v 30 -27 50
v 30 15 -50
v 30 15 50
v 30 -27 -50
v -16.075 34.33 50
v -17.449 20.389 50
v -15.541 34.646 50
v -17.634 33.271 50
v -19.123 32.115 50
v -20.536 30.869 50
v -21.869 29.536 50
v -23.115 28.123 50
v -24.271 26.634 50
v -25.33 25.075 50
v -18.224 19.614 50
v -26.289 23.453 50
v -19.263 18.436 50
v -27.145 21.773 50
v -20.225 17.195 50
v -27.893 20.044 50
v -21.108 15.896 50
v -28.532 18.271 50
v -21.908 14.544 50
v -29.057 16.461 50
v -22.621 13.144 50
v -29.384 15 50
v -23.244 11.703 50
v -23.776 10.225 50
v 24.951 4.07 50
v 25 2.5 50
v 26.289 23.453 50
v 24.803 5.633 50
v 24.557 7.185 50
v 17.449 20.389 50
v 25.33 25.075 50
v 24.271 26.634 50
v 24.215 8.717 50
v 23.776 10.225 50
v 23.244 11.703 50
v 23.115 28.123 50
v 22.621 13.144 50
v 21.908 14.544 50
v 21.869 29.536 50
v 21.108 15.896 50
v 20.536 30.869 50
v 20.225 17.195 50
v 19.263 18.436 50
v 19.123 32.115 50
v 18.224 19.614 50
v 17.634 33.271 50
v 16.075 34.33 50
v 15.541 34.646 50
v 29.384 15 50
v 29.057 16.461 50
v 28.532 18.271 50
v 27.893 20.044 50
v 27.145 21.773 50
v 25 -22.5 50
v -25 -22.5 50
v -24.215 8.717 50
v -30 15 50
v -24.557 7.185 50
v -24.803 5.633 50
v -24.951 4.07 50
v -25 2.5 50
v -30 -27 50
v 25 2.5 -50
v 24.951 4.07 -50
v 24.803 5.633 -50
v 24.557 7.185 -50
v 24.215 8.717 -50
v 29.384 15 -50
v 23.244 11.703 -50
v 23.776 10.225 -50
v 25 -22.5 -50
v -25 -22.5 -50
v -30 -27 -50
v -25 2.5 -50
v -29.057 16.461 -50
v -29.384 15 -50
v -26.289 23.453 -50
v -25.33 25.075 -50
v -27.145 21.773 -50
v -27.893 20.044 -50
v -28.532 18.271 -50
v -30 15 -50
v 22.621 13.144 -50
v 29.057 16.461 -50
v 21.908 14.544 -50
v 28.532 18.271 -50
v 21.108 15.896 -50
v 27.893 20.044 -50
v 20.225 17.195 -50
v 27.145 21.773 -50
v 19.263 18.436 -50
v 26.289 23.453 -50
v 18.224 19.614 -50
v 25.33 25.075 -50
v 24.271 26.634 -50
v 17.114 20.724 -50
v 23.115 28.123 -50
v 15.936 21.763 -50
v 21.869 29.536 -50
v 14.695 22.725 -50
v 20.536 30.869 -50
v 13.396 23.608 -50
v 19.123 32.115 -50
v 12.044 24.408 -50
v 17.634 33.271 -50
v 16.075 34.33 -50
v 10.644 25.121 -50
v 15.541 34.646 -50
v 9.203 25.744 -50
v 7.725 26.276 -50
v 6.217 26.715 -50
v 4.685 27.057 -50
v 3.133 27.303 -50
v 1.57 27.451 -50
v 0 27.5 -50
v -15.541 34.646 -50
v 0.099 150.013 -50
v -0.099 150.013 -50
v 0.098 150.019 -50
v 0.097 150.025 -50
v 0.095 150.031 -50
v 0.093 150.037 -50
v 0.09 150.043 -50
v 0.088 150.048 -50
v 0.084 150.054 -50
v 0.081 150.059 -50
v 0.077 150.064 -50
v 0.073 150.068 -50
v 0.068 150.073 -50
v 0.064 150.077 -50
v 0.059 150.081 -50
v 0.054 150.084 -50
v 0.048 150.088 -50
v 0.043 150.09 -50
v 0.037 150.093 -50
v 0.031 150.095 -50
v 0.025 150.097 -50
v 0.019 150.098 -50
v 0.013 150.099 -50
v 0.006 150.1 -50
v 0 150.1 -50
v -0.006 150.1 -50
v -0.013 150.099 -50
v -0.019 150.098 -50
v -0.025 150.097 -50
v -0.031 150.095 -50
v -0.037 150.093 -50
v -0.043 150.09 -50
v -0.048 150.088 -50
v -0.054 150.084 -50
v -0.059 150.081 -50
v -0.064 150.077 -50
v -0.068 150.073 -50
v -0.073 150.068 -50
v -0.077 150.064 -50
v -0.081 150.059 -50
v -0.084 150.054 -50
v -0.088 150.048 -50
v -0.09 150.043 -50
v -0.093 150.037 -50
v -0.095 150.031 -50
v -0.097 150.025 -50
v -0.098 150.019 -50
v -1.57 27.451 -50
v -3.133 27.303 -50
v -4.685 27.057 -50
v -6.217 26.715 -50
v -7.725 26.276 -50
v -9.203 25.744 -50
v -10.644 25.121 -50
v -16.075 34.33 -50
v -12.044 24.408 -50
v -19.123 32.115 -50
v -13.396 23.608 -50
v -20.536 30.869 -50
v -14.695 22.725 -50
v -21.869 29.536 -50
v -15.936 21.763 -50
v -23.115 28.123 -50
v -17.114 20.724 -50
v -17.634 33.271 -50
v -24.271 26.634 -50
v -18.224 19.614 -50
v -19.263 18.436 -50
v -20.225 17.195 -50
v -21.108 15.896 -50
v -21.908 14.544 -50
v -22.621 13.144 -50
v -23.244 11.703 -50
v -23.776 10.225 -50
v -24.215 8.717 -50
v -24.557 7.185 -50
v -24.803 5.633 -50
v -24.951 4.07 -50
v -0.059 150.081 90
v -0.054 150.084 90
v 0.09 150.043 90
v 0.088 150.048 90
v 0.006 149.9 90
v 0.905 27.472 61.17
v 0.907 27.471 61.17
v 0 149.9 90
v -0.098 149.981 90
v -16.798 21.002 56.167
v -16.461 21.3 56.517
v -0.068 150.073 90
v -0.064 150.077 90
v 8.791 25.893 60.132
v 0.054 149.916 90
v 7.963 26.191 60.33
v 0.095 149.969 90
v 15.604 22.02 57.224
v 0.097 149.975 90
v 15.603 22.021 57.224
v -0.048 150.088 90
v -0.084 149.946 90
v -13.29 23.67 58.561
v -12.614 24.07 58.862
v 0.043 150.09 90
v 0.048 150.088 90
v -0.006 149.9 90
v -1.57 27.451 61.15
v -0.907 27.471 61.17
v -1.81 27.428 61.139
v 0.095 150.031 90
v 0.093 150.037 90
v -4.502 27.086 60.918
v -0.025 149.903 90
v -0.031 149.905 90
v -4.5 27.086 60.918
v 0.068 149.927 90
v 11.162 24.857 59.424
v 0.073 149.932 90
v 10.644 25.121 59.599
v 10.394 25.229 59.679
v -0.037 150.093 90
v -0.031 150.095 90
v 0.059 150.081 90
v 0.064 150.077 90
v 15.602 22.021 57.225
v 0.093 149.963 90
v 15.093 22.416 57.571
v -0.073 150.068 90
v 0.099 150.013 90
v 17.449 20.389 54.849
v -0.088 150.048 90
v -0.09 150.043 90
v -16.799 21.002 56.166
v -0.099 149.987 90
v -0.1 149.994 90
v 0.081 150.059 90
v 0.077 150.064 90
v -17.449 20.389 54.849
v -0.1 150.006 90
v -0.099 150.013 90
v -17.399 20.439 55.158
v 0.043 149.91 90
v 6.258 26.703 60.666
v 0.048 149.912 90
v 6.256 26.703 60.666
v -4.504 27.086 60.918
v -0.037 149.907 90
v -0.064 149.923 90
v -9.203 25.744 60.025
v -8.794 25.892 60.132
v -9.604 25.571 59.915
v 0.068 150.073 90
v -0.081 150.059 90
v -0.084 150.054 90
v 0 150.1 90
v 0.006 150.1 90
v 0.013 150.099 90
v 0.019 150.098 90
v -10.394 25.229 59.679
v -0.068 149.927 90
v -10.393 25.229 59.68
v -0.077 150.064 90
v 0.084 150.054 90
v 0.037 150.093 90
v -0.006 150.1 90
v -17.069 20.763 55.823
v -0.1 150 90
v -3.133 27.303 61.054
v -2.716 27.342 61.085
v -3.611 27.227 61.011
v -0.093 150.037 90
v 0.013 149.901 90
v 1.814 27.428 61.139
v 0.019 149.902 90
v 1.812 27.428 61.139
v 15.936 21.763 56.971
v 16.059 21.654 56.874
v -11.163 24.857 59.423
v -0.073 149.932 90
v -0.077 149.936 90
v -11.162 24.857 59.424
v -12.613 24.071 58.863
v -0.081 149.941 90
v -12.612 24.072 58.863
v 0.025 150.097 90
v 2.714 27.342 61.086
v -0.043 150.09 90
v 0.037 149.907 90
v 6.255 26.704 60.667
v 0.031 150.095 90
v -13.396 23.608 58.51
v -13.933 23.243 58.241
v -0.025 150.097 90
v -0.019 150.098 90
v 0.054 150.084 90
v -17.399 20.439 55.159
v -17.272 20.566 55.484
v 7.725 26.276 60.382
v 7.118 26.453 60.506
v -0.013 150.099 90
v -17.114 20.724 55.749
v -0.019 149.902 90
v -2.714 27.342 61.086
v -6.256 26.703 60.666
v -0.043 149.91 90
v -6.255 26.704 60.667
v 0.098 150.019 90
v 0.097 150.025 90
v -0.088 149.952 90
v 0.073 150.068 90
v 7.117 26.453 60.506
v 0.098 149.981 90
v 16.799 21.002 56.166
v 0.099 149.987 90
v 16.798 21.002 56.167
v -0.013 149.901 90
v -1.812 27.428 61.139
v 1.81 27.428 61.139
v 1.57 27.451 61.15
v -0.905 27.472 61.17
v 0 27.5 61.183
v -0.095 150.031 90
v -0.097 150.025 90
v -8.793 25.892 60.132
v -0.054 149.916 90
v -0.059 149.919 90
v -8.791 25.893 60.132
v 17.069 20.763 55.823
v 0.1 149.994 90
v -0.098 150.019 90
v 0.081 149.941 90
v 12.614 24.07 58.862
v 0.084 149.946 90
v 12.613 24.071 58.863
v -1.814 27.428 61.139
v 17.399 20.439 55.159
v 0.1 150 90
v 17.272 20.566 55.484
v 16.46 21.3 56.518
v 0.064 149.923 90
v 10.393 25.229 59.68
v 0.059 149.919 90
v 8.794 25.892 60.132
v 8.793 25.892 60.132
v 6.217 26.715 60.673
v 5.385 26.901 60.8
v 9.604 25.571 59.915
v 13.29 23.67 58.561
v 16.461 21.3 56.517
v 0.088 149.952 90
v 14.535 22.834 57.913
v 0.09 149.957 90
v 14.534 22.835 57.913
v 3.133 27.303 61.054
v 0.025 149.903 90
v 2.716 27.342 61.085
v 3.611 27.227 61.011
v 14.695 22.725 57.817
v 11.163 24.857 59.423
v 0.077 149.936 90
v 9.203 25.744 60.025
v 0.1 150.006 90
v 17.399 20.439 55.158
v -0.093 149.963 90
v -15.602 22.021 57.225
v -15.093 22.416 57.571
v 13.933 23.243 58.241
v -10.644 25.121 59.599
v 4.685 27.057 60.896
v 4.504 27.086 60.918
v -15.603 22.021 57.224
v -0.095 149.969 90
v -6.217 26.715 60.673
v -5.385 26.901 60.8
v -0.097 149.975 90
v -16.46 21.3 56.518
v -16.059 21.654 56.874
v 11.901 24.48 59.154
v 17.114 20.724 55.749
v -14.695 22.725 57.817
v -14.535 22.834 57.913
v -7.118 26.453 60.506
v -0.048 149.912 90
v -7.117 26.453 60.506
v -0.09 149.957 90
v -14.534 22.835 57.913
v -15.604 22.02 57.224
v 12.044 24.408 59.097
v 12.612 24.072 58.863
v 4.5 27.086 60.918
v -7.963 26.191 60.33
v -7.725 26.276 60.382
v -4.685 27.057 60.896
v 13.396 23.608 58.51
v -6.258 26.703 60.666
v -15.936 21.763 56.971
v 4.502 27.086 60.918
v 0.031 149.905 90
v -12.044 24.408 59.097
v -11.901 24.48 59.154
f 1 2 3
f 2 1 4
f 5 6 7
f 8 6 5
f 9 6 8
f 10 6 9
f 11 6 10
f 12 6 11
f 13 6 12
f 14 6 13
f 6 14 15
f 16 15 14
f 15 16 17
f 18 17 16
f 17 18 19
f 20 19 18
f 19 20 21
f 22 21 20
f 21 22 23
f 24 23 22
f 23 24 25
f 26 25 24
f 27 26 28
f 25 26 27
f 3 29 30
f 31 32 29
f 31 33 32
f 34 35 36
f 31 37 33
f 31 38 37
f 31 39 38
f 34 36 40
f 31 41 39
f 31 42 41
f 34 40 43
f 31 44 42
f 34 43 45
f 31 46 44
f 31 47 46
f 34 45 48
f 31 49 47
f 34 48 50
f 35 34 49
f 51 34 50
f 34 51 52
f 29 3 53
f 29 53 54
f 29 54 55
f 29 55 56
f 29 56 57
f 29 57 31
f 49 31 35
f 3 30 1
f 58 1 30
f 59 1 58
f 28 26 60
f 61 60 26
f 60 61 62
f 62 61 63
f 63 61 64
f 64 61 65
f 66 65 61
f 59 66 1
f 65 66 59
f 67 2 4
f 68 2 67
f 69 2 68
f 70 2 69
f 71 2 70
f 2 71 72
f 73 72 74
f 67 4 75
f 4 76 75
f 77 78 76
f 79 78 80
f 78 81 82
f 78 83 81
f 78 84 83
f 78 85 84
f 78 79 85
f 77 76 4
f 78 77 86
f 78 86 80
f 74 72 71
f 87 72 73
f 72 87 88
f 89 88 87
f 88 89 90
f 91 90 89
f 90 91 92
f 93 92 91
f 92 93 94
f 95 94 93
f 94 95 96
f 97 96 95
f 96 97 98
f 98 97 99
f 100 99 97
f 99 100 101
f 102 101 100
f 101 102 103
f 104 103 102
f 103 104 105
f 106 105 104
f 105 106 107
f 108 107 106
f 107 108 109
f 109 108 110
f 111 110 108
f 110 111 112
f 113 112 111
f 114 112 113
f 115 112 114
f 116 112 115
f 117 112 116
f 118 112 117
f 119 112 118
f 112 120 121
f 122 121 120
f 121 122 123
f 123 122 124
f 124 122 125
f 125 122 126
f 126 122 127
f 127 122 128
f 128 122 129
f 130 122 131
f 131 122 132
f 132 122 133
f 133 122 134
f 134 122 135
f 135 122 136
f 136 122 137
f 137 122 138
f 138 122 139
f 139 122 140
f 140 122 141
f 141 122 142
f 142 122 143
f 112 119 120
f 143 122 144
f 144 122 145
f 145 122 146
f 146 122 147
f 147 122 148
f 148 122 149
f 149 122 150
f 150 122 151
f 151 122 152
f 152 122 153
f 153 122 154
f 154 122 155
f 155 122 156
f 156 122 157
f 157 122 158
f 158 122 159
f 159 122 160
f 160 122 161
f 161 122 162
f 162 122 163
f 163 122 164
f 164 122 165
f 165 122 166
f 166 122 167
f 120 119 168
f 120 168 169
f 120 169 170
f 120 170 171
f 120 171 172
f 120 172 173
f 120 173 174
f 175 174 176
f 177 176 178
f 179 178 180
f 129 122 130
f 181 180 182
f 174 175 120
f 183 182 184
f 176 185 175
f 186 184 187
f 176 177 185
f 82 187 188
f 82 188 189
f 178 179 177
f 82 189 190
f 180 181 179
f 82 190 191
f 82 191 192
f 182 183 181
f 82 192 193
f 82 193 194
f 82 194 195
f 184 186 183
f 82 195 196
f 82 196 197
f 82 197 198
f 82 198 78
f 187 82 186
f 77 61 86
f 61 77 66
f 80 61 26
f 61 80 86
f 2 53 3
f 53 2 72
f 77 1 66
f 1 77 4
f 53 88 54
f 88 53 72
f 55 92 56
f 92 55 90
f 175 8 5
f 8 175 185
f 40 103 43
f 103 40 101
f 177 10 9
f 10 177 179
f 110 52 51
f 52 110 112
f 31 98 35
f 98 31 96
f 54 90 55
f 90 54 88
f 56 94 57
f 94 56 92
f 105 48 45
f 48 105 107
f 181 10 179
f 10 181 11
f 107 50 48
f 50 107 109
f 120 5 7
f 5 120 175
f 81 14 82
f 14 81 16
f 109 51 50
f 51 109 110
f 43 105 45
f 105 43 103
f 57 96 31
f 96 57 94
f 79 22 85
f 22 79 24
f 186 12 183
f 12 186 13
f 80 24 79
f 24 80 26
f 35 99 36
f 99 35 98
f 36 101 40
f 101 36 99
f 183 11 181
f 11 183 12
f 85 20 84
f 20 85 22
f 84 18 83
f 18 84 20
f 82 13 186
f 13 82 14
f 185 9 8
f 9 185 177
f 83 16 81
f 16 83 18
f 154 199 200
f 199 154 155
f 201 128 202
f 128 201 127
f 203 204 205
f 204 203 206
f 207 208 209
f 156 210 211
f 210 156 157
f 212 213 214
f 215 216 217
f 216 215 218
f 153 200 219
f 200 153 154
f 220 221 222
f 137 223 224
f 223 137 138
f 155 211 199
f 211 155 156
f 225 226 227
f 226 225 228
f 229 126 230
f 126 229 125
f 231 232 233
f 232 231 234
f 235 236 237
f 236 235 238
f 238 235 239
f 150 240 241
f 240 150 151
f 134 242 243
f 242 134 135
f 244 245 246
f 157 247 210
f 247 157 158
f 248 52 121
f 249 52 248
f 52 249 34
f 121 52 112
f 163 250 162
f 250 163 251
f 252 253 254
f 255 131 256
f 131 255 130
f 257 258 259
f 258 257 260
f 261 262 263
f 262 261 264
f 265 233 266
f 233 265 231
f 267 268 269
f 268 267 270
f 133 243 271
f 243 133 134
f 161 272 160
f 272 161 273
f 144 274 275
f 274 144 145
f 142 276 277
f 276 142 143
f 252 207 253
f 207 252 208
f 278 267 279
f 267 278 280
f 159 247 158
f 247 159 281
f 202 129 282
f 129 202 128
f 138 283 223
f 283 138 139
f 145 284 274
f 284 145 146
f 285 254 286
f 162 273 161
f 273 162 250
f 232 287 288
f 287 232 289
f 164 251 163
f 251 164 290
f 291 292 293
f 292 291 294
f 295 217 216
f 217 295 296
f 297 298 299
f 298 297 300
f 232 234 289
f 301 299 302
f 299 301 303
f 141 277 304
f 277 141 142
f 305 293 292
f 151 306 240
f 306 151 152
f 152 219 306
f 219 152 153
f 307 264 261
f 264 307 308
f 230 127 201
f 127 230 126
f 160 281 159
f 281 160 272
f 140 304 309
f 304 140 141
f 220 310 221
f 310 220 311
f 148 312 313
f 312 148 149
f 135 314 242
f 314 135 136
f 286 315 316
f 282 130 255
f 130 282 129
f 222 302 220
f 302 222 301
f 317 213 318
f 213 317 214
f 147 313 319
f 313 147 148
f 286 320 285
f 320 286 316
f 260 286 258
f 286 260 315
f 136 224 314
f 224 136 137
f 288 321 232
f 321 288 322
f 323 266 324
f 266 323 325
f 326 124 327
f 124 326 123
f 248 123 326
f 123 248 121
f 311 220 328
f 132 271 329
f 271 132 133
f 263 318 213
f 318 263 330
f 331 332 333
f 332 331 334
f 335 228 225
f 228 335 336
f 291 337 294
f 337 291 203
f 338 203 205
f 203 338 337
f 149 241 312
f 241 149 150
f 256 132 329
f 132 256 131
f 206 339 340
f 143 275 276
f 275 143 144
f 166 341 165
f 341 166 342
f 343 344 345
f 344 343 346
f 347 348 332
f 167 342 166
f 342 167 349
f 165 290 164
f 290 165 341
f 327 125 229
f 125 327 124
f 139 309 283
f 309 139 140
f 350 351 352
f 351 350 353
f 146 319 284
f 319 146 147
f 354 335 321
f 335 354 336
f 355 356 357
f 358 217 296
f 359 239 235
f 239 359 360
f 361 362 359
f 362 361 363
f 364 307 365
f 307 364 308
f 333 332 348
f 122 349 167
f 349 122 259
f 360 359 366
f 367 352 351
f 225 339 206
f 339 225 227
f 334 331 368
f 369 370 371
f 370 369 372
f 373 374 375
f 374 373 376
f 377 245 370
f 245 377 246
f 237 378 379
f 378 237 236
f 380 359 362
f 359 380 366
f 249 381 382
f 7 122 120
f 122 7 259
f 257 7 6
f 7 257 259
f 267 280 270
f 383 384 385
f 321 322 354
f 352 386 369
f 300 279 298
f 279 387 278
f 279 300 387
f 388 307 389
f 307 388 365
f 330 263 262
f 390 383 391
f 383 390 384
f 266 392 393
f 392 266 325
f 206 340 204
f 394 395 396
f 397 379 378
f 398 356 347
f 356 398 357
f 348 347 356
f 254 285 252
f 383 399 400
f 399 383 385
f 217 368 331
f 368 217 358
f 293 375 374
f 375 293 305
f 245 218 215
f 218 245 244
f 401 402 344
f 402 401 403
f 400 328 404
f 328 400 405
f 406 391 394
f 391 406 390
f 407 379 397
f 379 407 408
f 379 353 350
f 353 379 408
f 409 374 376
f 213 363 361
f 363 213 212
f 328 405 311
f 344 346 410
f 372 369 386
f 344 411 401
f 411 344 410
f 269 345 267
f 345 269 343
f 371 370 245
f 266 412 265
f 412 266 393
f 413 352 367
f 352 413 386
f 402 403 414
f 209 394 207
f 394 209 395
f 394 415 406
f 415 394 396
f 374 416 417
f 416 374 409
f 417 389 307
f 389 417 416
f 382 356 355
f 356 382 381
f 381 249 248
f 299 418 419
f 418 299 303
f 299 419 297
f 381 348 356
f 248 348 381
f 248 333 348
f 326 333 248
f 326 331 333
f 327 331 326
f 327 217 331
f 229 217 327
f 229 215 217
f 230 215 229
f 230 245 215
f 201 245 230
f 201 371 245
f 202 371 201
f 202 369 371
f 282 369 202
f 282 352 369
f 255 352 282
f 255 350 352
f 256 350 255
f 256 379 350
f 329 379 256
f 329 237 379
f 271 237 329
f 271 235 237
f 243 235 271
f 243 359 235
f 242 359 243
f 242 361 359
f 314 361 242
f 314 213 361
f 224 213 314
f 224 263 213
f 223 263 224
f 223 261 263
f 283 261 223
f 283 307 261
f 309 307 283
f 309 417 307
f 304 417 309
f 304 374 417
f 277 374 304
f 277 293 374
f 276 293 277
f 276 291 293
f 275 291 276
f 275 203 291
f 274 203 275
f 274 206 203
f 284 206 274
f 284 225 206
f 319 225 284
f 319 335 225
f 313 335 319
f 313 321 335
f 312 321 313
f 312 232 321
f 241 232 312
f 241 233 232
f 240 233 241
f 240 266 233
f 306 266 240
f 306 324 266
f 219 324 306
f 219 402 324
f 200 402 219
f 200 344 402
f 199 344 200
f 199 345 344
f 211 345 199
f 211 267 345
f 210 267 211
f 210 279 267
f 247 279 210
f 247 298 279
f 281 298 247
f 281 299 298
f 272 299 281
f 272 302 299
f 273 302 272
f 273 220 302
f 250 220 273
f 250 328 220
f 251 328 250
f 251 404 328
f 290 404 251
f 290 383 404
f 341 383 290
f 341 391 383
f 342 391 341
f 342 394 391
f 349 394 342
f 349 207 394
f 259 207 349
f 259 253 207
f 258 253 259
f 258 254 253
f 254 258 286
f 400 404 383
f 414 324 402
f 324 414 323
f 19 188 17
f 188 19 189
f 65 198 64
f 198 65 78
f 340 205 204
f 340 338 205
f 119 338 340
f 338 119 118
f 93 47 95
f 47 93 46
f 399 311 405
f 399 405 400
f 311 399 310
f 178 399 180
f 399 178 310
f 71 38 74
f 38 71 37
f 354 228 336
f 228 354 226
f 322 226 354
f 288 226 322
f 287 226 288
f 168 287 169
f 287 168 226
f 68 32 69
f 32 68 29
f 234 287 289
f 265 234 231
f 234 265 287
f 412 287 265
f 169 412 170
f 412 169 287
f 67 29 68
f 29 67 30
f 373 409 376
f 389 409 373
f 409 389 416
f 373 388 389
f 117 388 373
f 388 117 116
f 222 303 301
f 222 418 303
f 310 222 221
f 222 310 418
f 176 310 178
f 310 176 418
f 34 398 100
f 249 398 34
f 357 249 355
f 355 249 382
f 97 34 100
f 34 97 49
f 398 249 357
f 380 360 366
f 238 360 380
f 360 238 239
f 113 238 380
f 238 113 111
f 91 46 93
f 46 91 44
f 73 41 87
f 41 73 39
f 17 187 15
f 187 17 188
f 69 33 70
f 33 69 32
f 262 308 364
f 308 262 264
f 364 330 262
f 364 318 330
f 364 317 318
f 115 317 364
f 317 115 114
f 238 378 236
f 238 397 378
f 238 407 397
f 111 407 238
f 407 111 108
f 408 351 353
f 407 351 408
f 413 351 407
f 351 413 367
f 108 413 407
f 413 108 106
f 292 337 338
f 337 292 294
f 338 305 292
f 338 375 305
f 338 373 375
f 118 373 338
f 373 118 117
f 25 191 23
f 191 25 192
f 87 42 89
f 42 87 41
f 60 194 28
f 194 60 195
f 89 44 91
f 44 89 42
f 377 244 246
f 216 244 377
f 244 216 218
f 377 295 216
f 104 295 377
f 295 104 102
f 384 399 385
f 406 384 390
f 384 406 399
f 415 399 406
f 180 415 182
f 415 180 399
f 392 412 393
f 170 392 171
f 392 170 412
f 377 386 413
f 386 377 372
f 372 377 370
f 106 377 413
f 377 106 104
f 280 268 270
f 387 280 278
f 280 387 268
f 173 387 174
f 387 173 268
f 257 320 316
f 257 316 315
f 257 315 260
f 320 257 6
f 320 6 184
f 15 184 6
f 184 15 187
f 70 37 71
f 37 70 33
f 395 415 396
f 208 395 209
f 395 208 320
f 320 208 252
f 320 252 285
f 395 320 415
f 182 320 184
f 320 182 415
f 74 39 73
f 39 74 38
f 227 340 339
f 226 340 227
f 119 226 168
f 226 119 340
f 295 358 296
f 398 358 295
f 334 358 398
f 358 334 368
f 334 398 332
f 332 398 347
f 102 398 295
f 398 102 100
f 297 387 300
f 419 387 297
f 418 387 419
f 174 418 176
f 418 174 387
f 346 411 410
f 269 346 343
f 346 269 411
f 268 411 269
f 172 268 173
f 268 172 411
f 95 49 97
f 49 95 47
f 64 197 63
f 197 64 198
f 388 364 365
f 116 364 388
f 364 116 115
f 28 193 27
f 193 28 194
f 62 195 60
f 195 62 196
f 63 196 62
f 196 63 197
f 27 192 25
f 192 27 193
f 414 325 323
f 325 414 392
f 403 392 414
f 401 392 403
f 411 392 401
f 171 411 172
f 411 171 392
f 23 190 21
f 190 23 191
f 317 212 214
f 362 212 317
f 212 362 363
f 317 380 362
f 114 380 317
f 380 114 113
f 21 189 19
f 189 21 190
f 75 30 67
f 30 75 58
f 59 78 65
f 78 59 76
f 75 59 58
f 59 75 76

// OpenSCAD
// Customizable simple axe head

//Customizer Variables

//axe head back
r= 60; //[1:200]

//resolution
n=100; //[1:200]

//axe head height
h=100; //[1:500]

// handle hole radius
x=25; // 

//scale
s=150; //

// blade lip
l=40;//

// roundness
a=20;//

// base blade thickness
b=20;//

module chuck(){
	union(){
translate([0,-0.1*r,0])cube([r,0.7*r,h], center = true);
translate([0,0.3*r/2,0])cylinder(h = h, r1 = r/2, r2 = r/2, center = true, $fn=n);
}
}

module chunk(){
chuck();
hull(){
cylinder(h = h, r1 = b, r2 = b, center = true, $fn=n);
translate([0,s,l/2])cylinder(h = h+l, r1 = 0.1, r2 = 0.1, center = true, $fn=n);
				}
}

module axehead(){
	difference(){
	chunk();	
	translate([0,x*.1,0])cylinder(h = h+l+1, r1 = x, r2 = x, center = true, $fn=n);
	translate([-x,-x*.9,-h/2-1])cube([2*x, x,h+l+1,]);
	}
					}
axehead();
